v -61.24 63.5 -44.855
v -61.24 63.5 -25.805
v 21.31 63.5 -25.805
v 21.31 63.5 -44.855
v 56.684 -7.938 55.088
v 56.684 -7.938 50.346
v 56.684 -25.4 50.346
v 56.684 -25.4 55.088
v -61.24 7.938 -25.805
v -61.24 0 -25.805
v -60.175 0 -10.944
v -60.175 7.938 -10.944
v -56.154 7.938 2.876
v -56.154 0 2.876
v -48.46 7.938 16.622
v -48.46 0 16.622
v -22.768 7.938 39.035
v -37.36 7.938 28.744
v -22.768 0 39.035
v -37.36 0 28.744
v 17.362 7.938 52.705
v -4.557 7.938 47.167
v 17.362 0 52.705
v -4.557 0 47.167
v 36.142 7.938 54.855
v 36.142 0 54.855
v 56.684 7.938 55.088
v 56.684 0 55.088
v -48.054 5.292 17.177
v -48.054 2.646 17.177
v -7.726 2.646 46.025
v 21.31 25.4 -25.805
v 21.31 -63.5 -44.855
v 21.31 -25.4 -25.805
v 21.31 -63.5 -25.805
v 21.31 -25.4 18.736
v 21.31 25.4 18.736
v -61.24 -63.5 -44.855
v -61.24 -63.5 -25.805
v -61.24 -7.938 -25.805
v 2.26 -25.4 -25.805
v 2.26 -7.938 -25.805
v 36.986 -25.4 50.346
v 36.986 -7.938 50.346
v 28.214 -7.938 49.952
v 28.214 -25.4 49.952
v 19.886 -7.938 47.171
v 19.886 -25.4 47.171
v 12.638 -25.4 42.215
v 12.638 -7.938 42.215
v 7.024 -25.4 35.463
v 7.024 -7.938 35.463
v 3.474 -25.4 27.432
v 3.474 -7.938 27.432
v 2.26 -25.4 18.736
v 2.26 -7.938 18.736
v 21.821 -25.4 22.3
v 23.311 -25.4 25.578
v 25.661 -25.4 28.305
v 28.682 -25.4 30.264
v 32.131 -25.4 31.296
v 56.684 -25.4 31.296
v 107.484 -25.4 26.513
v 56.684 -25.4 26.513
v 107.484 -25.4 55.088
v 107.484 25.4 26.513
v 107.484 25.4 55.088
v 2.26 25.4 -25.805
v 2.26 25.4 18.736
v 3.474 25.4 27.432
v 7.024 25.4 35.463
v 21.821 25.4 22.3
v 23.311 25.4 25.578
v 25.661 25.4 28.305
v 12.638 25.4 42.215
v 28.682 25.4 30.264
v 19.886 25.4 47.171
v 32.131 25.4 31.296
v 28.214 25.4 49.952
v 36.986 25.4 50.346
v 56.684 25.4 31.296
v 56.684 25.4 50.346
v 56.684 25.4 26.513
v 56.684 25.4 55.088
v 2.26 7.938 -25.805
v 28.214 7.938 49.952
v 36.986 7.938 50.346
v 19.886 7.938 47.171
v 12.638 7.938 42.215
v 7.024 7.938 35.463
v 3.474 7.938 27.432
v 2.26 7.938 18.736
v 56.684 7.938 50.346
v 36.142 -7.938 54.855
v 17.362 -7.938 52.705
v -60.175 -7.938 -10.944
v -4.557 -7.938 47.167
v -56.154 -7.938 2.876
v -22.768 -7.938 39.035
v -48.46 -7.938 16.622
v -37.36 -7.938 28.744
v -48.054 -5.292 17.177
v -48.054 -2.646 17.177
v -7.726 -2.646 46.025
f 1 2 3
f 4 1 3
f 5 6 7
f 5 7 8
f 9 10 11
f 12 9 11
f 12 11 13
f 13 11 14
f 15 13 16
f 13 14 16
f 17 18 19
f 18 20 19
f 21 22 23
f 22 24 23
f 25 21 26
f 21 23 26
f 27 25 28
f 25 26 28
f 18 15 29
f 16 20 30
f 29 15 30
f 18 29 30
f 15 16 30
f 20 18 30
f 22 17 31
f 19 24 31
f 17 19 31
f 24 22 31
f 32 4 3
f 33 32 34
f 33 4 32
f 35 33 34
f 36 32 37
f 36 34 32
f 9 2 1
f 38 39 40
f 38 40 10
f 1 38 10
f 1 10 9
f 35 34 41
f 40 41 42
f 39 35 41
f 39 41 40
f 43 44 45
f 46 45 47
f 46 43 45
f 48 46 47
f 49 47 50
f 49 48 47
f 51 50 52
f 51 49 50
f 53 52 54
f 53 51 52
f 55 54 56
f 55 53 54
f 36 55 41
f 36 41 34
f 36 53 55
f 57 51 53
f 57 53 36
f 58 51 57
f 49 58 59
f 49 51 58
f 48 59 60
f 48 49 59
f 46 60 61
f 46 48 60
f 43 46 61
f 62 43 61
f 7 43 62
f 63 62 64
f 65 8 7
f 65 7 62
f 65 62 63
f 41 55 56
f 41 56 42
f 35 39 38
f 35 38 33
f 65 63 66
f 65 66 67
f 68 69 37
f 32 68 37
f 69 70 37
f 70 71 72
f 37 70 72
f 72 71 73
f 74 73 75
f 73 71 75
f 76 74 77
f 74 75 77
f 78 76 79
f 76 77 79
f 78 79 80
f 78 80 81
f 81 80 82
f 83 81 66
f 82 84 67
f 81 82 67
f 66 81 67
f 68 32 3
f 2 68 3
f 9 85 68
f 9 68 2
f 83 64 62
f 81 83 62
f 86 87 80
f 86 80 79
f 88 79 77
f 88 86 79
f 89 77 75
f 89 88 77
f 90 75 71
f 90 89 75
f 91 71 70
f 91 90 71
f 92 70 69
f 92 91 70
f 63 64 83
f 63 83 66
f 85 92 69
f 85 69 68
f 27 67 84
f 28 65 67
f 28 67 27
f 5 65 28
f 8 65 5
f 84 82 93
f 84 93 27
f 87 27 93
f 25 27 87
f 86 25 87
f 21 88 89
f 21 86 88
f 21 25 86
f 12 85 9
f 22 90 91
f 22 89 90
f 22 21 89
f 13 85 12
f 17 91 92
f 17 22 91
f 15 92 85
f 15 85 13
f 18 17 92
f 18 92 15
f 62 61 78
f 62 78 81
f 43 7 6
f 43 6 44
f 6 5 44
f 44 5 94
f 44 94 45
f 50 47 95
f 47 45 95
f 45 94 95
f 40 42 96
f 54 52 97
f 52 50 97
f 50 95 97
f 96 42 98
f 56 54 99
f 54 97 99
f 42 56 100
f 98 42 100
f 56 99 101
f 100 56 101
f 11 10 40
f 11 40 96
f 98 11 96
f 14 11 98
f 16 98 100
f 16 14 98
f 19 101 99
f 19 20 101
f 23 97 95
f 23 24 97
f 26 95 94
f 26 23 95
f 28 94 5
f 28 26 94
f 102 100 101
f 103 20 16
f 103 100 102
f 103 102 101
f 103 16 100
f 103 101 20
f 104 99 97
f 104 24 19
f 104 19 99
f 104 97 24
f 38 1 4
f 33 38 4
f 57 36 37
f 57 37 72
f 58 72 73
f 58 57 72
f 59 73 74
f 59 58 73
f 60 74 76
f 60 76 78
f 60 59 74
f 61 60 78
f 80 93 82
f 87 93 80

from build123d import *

# Parameters (mm, degrees)
F1_DEPTH = 63.5
F0_W     = 21.5476495911
F0_H     = 19.05
F0_H_2   = 4.74163435
F0_H_3   = 4.78336565
F2_DEPTH = 25.4
F3_DEPTH = 7.9375


with BuildPart() as f1:
    # F0 (on Front) → F1 (new body, symmetric)
    with BuildSketch(Plane.XZ):
        Polygon((2.2602985501, -25.8045658022), (-61.2397014499, -25.8045658022), (-61.2397014499, -44.8545658022), (21.3102985501, -44.8545658022), (21.3102985501, -25.8045658022), align=None)
    extrude(amount=F1_DEPTH, both=True)

    # F0 (on Front) → F2 (join, symmetric)
    with BuildSketch(Plane.XZ):
        with BuildLine():
            Line((2.2602985501, 18.735807389), (2.2602985501, -25.8045658022))
            Line((2.2602985501, -25.8045658022), (21.3102985501, -25.8045658022))
            Line((21.3102985501, -25.8045658022), (21.3102985501, 18.735807389))
            ThreePointArc((21.3102985501, 18.735807389), (24.3886183402, 27.025154163), (32.131285942, 31.2960347603))
            Line((32.131285942, 31.2960347603), (56.6837708669, 31.2960347603))
            Line((56.6837708669, 31.2960347603), (56.6837708669, 50.3460347603))
            Line((56.6837708669, 50.3460347603), (36.9862060647, 50.3460347603))
            ThreePointArc((36.9862060647, 50.3460347603), (12.6376824677, 42.2150276017), (2.2602985501, 18.735807389))
        make_face()
        with Locations((67.4575956625, 40.8210347603)):
            Rectangle(F0_W, F0_H)
        Polygon((107.4837708669, 55.0876691103), (78.231420458, 55.0876691103), (78.231420458, 50.3460347603), (78.231420458, 31.2960347603), (78.231420458, 26.5126691103), (107.4837708669, 26.5126691103), align=None)
        with Locations((67.4575956625, 52.7168519353)):
            Rectangle(F0_W, F0_H_2)
        with Locations((67.4575956625, 28.9043519353)):
            Rectangle(F0_W, F0_H_3)
    extrude(amount=F2_DEPTH, both=True)

    # F0 (on Front) → F3 (join, symmetric)
    with BuildSketch(Plane.XZ):
        with BuildLine():
            add(Edge.make_bspline(
                [(-61.2397014499, -25.8045658022), (-62.6449435949, 22.3603788763), (-18.7473557889, 57.8006356955), (56.6837708669, 55.0876691103)],
                knots=[0, 0, 0, 0, 143.001744718, 143.001744718, 143.001744718, 143.001744718], degree=3))
            Line((-61.2397014499, -25.8045658022), (2.2602985501, -25.8045658022))
            Line((2.2602985501, -25.8045658022), (2.2602985501, 18.735807389))
            ThreePointArc((2.2602985501, 18.735807389), (12.6376824677, 42.2150276017), (36.9862060647, 50.3460347603))
            Line((36.9862060647, 50.3460347603), (56.6837708669, 50.3460347603))
            Line((56.6837708669, 50.3460347603), (56.6837708669, 55.0876691103))
        make_face()
    extrude(amount=F3_DEPTH, both=True)


solid = f1.part
